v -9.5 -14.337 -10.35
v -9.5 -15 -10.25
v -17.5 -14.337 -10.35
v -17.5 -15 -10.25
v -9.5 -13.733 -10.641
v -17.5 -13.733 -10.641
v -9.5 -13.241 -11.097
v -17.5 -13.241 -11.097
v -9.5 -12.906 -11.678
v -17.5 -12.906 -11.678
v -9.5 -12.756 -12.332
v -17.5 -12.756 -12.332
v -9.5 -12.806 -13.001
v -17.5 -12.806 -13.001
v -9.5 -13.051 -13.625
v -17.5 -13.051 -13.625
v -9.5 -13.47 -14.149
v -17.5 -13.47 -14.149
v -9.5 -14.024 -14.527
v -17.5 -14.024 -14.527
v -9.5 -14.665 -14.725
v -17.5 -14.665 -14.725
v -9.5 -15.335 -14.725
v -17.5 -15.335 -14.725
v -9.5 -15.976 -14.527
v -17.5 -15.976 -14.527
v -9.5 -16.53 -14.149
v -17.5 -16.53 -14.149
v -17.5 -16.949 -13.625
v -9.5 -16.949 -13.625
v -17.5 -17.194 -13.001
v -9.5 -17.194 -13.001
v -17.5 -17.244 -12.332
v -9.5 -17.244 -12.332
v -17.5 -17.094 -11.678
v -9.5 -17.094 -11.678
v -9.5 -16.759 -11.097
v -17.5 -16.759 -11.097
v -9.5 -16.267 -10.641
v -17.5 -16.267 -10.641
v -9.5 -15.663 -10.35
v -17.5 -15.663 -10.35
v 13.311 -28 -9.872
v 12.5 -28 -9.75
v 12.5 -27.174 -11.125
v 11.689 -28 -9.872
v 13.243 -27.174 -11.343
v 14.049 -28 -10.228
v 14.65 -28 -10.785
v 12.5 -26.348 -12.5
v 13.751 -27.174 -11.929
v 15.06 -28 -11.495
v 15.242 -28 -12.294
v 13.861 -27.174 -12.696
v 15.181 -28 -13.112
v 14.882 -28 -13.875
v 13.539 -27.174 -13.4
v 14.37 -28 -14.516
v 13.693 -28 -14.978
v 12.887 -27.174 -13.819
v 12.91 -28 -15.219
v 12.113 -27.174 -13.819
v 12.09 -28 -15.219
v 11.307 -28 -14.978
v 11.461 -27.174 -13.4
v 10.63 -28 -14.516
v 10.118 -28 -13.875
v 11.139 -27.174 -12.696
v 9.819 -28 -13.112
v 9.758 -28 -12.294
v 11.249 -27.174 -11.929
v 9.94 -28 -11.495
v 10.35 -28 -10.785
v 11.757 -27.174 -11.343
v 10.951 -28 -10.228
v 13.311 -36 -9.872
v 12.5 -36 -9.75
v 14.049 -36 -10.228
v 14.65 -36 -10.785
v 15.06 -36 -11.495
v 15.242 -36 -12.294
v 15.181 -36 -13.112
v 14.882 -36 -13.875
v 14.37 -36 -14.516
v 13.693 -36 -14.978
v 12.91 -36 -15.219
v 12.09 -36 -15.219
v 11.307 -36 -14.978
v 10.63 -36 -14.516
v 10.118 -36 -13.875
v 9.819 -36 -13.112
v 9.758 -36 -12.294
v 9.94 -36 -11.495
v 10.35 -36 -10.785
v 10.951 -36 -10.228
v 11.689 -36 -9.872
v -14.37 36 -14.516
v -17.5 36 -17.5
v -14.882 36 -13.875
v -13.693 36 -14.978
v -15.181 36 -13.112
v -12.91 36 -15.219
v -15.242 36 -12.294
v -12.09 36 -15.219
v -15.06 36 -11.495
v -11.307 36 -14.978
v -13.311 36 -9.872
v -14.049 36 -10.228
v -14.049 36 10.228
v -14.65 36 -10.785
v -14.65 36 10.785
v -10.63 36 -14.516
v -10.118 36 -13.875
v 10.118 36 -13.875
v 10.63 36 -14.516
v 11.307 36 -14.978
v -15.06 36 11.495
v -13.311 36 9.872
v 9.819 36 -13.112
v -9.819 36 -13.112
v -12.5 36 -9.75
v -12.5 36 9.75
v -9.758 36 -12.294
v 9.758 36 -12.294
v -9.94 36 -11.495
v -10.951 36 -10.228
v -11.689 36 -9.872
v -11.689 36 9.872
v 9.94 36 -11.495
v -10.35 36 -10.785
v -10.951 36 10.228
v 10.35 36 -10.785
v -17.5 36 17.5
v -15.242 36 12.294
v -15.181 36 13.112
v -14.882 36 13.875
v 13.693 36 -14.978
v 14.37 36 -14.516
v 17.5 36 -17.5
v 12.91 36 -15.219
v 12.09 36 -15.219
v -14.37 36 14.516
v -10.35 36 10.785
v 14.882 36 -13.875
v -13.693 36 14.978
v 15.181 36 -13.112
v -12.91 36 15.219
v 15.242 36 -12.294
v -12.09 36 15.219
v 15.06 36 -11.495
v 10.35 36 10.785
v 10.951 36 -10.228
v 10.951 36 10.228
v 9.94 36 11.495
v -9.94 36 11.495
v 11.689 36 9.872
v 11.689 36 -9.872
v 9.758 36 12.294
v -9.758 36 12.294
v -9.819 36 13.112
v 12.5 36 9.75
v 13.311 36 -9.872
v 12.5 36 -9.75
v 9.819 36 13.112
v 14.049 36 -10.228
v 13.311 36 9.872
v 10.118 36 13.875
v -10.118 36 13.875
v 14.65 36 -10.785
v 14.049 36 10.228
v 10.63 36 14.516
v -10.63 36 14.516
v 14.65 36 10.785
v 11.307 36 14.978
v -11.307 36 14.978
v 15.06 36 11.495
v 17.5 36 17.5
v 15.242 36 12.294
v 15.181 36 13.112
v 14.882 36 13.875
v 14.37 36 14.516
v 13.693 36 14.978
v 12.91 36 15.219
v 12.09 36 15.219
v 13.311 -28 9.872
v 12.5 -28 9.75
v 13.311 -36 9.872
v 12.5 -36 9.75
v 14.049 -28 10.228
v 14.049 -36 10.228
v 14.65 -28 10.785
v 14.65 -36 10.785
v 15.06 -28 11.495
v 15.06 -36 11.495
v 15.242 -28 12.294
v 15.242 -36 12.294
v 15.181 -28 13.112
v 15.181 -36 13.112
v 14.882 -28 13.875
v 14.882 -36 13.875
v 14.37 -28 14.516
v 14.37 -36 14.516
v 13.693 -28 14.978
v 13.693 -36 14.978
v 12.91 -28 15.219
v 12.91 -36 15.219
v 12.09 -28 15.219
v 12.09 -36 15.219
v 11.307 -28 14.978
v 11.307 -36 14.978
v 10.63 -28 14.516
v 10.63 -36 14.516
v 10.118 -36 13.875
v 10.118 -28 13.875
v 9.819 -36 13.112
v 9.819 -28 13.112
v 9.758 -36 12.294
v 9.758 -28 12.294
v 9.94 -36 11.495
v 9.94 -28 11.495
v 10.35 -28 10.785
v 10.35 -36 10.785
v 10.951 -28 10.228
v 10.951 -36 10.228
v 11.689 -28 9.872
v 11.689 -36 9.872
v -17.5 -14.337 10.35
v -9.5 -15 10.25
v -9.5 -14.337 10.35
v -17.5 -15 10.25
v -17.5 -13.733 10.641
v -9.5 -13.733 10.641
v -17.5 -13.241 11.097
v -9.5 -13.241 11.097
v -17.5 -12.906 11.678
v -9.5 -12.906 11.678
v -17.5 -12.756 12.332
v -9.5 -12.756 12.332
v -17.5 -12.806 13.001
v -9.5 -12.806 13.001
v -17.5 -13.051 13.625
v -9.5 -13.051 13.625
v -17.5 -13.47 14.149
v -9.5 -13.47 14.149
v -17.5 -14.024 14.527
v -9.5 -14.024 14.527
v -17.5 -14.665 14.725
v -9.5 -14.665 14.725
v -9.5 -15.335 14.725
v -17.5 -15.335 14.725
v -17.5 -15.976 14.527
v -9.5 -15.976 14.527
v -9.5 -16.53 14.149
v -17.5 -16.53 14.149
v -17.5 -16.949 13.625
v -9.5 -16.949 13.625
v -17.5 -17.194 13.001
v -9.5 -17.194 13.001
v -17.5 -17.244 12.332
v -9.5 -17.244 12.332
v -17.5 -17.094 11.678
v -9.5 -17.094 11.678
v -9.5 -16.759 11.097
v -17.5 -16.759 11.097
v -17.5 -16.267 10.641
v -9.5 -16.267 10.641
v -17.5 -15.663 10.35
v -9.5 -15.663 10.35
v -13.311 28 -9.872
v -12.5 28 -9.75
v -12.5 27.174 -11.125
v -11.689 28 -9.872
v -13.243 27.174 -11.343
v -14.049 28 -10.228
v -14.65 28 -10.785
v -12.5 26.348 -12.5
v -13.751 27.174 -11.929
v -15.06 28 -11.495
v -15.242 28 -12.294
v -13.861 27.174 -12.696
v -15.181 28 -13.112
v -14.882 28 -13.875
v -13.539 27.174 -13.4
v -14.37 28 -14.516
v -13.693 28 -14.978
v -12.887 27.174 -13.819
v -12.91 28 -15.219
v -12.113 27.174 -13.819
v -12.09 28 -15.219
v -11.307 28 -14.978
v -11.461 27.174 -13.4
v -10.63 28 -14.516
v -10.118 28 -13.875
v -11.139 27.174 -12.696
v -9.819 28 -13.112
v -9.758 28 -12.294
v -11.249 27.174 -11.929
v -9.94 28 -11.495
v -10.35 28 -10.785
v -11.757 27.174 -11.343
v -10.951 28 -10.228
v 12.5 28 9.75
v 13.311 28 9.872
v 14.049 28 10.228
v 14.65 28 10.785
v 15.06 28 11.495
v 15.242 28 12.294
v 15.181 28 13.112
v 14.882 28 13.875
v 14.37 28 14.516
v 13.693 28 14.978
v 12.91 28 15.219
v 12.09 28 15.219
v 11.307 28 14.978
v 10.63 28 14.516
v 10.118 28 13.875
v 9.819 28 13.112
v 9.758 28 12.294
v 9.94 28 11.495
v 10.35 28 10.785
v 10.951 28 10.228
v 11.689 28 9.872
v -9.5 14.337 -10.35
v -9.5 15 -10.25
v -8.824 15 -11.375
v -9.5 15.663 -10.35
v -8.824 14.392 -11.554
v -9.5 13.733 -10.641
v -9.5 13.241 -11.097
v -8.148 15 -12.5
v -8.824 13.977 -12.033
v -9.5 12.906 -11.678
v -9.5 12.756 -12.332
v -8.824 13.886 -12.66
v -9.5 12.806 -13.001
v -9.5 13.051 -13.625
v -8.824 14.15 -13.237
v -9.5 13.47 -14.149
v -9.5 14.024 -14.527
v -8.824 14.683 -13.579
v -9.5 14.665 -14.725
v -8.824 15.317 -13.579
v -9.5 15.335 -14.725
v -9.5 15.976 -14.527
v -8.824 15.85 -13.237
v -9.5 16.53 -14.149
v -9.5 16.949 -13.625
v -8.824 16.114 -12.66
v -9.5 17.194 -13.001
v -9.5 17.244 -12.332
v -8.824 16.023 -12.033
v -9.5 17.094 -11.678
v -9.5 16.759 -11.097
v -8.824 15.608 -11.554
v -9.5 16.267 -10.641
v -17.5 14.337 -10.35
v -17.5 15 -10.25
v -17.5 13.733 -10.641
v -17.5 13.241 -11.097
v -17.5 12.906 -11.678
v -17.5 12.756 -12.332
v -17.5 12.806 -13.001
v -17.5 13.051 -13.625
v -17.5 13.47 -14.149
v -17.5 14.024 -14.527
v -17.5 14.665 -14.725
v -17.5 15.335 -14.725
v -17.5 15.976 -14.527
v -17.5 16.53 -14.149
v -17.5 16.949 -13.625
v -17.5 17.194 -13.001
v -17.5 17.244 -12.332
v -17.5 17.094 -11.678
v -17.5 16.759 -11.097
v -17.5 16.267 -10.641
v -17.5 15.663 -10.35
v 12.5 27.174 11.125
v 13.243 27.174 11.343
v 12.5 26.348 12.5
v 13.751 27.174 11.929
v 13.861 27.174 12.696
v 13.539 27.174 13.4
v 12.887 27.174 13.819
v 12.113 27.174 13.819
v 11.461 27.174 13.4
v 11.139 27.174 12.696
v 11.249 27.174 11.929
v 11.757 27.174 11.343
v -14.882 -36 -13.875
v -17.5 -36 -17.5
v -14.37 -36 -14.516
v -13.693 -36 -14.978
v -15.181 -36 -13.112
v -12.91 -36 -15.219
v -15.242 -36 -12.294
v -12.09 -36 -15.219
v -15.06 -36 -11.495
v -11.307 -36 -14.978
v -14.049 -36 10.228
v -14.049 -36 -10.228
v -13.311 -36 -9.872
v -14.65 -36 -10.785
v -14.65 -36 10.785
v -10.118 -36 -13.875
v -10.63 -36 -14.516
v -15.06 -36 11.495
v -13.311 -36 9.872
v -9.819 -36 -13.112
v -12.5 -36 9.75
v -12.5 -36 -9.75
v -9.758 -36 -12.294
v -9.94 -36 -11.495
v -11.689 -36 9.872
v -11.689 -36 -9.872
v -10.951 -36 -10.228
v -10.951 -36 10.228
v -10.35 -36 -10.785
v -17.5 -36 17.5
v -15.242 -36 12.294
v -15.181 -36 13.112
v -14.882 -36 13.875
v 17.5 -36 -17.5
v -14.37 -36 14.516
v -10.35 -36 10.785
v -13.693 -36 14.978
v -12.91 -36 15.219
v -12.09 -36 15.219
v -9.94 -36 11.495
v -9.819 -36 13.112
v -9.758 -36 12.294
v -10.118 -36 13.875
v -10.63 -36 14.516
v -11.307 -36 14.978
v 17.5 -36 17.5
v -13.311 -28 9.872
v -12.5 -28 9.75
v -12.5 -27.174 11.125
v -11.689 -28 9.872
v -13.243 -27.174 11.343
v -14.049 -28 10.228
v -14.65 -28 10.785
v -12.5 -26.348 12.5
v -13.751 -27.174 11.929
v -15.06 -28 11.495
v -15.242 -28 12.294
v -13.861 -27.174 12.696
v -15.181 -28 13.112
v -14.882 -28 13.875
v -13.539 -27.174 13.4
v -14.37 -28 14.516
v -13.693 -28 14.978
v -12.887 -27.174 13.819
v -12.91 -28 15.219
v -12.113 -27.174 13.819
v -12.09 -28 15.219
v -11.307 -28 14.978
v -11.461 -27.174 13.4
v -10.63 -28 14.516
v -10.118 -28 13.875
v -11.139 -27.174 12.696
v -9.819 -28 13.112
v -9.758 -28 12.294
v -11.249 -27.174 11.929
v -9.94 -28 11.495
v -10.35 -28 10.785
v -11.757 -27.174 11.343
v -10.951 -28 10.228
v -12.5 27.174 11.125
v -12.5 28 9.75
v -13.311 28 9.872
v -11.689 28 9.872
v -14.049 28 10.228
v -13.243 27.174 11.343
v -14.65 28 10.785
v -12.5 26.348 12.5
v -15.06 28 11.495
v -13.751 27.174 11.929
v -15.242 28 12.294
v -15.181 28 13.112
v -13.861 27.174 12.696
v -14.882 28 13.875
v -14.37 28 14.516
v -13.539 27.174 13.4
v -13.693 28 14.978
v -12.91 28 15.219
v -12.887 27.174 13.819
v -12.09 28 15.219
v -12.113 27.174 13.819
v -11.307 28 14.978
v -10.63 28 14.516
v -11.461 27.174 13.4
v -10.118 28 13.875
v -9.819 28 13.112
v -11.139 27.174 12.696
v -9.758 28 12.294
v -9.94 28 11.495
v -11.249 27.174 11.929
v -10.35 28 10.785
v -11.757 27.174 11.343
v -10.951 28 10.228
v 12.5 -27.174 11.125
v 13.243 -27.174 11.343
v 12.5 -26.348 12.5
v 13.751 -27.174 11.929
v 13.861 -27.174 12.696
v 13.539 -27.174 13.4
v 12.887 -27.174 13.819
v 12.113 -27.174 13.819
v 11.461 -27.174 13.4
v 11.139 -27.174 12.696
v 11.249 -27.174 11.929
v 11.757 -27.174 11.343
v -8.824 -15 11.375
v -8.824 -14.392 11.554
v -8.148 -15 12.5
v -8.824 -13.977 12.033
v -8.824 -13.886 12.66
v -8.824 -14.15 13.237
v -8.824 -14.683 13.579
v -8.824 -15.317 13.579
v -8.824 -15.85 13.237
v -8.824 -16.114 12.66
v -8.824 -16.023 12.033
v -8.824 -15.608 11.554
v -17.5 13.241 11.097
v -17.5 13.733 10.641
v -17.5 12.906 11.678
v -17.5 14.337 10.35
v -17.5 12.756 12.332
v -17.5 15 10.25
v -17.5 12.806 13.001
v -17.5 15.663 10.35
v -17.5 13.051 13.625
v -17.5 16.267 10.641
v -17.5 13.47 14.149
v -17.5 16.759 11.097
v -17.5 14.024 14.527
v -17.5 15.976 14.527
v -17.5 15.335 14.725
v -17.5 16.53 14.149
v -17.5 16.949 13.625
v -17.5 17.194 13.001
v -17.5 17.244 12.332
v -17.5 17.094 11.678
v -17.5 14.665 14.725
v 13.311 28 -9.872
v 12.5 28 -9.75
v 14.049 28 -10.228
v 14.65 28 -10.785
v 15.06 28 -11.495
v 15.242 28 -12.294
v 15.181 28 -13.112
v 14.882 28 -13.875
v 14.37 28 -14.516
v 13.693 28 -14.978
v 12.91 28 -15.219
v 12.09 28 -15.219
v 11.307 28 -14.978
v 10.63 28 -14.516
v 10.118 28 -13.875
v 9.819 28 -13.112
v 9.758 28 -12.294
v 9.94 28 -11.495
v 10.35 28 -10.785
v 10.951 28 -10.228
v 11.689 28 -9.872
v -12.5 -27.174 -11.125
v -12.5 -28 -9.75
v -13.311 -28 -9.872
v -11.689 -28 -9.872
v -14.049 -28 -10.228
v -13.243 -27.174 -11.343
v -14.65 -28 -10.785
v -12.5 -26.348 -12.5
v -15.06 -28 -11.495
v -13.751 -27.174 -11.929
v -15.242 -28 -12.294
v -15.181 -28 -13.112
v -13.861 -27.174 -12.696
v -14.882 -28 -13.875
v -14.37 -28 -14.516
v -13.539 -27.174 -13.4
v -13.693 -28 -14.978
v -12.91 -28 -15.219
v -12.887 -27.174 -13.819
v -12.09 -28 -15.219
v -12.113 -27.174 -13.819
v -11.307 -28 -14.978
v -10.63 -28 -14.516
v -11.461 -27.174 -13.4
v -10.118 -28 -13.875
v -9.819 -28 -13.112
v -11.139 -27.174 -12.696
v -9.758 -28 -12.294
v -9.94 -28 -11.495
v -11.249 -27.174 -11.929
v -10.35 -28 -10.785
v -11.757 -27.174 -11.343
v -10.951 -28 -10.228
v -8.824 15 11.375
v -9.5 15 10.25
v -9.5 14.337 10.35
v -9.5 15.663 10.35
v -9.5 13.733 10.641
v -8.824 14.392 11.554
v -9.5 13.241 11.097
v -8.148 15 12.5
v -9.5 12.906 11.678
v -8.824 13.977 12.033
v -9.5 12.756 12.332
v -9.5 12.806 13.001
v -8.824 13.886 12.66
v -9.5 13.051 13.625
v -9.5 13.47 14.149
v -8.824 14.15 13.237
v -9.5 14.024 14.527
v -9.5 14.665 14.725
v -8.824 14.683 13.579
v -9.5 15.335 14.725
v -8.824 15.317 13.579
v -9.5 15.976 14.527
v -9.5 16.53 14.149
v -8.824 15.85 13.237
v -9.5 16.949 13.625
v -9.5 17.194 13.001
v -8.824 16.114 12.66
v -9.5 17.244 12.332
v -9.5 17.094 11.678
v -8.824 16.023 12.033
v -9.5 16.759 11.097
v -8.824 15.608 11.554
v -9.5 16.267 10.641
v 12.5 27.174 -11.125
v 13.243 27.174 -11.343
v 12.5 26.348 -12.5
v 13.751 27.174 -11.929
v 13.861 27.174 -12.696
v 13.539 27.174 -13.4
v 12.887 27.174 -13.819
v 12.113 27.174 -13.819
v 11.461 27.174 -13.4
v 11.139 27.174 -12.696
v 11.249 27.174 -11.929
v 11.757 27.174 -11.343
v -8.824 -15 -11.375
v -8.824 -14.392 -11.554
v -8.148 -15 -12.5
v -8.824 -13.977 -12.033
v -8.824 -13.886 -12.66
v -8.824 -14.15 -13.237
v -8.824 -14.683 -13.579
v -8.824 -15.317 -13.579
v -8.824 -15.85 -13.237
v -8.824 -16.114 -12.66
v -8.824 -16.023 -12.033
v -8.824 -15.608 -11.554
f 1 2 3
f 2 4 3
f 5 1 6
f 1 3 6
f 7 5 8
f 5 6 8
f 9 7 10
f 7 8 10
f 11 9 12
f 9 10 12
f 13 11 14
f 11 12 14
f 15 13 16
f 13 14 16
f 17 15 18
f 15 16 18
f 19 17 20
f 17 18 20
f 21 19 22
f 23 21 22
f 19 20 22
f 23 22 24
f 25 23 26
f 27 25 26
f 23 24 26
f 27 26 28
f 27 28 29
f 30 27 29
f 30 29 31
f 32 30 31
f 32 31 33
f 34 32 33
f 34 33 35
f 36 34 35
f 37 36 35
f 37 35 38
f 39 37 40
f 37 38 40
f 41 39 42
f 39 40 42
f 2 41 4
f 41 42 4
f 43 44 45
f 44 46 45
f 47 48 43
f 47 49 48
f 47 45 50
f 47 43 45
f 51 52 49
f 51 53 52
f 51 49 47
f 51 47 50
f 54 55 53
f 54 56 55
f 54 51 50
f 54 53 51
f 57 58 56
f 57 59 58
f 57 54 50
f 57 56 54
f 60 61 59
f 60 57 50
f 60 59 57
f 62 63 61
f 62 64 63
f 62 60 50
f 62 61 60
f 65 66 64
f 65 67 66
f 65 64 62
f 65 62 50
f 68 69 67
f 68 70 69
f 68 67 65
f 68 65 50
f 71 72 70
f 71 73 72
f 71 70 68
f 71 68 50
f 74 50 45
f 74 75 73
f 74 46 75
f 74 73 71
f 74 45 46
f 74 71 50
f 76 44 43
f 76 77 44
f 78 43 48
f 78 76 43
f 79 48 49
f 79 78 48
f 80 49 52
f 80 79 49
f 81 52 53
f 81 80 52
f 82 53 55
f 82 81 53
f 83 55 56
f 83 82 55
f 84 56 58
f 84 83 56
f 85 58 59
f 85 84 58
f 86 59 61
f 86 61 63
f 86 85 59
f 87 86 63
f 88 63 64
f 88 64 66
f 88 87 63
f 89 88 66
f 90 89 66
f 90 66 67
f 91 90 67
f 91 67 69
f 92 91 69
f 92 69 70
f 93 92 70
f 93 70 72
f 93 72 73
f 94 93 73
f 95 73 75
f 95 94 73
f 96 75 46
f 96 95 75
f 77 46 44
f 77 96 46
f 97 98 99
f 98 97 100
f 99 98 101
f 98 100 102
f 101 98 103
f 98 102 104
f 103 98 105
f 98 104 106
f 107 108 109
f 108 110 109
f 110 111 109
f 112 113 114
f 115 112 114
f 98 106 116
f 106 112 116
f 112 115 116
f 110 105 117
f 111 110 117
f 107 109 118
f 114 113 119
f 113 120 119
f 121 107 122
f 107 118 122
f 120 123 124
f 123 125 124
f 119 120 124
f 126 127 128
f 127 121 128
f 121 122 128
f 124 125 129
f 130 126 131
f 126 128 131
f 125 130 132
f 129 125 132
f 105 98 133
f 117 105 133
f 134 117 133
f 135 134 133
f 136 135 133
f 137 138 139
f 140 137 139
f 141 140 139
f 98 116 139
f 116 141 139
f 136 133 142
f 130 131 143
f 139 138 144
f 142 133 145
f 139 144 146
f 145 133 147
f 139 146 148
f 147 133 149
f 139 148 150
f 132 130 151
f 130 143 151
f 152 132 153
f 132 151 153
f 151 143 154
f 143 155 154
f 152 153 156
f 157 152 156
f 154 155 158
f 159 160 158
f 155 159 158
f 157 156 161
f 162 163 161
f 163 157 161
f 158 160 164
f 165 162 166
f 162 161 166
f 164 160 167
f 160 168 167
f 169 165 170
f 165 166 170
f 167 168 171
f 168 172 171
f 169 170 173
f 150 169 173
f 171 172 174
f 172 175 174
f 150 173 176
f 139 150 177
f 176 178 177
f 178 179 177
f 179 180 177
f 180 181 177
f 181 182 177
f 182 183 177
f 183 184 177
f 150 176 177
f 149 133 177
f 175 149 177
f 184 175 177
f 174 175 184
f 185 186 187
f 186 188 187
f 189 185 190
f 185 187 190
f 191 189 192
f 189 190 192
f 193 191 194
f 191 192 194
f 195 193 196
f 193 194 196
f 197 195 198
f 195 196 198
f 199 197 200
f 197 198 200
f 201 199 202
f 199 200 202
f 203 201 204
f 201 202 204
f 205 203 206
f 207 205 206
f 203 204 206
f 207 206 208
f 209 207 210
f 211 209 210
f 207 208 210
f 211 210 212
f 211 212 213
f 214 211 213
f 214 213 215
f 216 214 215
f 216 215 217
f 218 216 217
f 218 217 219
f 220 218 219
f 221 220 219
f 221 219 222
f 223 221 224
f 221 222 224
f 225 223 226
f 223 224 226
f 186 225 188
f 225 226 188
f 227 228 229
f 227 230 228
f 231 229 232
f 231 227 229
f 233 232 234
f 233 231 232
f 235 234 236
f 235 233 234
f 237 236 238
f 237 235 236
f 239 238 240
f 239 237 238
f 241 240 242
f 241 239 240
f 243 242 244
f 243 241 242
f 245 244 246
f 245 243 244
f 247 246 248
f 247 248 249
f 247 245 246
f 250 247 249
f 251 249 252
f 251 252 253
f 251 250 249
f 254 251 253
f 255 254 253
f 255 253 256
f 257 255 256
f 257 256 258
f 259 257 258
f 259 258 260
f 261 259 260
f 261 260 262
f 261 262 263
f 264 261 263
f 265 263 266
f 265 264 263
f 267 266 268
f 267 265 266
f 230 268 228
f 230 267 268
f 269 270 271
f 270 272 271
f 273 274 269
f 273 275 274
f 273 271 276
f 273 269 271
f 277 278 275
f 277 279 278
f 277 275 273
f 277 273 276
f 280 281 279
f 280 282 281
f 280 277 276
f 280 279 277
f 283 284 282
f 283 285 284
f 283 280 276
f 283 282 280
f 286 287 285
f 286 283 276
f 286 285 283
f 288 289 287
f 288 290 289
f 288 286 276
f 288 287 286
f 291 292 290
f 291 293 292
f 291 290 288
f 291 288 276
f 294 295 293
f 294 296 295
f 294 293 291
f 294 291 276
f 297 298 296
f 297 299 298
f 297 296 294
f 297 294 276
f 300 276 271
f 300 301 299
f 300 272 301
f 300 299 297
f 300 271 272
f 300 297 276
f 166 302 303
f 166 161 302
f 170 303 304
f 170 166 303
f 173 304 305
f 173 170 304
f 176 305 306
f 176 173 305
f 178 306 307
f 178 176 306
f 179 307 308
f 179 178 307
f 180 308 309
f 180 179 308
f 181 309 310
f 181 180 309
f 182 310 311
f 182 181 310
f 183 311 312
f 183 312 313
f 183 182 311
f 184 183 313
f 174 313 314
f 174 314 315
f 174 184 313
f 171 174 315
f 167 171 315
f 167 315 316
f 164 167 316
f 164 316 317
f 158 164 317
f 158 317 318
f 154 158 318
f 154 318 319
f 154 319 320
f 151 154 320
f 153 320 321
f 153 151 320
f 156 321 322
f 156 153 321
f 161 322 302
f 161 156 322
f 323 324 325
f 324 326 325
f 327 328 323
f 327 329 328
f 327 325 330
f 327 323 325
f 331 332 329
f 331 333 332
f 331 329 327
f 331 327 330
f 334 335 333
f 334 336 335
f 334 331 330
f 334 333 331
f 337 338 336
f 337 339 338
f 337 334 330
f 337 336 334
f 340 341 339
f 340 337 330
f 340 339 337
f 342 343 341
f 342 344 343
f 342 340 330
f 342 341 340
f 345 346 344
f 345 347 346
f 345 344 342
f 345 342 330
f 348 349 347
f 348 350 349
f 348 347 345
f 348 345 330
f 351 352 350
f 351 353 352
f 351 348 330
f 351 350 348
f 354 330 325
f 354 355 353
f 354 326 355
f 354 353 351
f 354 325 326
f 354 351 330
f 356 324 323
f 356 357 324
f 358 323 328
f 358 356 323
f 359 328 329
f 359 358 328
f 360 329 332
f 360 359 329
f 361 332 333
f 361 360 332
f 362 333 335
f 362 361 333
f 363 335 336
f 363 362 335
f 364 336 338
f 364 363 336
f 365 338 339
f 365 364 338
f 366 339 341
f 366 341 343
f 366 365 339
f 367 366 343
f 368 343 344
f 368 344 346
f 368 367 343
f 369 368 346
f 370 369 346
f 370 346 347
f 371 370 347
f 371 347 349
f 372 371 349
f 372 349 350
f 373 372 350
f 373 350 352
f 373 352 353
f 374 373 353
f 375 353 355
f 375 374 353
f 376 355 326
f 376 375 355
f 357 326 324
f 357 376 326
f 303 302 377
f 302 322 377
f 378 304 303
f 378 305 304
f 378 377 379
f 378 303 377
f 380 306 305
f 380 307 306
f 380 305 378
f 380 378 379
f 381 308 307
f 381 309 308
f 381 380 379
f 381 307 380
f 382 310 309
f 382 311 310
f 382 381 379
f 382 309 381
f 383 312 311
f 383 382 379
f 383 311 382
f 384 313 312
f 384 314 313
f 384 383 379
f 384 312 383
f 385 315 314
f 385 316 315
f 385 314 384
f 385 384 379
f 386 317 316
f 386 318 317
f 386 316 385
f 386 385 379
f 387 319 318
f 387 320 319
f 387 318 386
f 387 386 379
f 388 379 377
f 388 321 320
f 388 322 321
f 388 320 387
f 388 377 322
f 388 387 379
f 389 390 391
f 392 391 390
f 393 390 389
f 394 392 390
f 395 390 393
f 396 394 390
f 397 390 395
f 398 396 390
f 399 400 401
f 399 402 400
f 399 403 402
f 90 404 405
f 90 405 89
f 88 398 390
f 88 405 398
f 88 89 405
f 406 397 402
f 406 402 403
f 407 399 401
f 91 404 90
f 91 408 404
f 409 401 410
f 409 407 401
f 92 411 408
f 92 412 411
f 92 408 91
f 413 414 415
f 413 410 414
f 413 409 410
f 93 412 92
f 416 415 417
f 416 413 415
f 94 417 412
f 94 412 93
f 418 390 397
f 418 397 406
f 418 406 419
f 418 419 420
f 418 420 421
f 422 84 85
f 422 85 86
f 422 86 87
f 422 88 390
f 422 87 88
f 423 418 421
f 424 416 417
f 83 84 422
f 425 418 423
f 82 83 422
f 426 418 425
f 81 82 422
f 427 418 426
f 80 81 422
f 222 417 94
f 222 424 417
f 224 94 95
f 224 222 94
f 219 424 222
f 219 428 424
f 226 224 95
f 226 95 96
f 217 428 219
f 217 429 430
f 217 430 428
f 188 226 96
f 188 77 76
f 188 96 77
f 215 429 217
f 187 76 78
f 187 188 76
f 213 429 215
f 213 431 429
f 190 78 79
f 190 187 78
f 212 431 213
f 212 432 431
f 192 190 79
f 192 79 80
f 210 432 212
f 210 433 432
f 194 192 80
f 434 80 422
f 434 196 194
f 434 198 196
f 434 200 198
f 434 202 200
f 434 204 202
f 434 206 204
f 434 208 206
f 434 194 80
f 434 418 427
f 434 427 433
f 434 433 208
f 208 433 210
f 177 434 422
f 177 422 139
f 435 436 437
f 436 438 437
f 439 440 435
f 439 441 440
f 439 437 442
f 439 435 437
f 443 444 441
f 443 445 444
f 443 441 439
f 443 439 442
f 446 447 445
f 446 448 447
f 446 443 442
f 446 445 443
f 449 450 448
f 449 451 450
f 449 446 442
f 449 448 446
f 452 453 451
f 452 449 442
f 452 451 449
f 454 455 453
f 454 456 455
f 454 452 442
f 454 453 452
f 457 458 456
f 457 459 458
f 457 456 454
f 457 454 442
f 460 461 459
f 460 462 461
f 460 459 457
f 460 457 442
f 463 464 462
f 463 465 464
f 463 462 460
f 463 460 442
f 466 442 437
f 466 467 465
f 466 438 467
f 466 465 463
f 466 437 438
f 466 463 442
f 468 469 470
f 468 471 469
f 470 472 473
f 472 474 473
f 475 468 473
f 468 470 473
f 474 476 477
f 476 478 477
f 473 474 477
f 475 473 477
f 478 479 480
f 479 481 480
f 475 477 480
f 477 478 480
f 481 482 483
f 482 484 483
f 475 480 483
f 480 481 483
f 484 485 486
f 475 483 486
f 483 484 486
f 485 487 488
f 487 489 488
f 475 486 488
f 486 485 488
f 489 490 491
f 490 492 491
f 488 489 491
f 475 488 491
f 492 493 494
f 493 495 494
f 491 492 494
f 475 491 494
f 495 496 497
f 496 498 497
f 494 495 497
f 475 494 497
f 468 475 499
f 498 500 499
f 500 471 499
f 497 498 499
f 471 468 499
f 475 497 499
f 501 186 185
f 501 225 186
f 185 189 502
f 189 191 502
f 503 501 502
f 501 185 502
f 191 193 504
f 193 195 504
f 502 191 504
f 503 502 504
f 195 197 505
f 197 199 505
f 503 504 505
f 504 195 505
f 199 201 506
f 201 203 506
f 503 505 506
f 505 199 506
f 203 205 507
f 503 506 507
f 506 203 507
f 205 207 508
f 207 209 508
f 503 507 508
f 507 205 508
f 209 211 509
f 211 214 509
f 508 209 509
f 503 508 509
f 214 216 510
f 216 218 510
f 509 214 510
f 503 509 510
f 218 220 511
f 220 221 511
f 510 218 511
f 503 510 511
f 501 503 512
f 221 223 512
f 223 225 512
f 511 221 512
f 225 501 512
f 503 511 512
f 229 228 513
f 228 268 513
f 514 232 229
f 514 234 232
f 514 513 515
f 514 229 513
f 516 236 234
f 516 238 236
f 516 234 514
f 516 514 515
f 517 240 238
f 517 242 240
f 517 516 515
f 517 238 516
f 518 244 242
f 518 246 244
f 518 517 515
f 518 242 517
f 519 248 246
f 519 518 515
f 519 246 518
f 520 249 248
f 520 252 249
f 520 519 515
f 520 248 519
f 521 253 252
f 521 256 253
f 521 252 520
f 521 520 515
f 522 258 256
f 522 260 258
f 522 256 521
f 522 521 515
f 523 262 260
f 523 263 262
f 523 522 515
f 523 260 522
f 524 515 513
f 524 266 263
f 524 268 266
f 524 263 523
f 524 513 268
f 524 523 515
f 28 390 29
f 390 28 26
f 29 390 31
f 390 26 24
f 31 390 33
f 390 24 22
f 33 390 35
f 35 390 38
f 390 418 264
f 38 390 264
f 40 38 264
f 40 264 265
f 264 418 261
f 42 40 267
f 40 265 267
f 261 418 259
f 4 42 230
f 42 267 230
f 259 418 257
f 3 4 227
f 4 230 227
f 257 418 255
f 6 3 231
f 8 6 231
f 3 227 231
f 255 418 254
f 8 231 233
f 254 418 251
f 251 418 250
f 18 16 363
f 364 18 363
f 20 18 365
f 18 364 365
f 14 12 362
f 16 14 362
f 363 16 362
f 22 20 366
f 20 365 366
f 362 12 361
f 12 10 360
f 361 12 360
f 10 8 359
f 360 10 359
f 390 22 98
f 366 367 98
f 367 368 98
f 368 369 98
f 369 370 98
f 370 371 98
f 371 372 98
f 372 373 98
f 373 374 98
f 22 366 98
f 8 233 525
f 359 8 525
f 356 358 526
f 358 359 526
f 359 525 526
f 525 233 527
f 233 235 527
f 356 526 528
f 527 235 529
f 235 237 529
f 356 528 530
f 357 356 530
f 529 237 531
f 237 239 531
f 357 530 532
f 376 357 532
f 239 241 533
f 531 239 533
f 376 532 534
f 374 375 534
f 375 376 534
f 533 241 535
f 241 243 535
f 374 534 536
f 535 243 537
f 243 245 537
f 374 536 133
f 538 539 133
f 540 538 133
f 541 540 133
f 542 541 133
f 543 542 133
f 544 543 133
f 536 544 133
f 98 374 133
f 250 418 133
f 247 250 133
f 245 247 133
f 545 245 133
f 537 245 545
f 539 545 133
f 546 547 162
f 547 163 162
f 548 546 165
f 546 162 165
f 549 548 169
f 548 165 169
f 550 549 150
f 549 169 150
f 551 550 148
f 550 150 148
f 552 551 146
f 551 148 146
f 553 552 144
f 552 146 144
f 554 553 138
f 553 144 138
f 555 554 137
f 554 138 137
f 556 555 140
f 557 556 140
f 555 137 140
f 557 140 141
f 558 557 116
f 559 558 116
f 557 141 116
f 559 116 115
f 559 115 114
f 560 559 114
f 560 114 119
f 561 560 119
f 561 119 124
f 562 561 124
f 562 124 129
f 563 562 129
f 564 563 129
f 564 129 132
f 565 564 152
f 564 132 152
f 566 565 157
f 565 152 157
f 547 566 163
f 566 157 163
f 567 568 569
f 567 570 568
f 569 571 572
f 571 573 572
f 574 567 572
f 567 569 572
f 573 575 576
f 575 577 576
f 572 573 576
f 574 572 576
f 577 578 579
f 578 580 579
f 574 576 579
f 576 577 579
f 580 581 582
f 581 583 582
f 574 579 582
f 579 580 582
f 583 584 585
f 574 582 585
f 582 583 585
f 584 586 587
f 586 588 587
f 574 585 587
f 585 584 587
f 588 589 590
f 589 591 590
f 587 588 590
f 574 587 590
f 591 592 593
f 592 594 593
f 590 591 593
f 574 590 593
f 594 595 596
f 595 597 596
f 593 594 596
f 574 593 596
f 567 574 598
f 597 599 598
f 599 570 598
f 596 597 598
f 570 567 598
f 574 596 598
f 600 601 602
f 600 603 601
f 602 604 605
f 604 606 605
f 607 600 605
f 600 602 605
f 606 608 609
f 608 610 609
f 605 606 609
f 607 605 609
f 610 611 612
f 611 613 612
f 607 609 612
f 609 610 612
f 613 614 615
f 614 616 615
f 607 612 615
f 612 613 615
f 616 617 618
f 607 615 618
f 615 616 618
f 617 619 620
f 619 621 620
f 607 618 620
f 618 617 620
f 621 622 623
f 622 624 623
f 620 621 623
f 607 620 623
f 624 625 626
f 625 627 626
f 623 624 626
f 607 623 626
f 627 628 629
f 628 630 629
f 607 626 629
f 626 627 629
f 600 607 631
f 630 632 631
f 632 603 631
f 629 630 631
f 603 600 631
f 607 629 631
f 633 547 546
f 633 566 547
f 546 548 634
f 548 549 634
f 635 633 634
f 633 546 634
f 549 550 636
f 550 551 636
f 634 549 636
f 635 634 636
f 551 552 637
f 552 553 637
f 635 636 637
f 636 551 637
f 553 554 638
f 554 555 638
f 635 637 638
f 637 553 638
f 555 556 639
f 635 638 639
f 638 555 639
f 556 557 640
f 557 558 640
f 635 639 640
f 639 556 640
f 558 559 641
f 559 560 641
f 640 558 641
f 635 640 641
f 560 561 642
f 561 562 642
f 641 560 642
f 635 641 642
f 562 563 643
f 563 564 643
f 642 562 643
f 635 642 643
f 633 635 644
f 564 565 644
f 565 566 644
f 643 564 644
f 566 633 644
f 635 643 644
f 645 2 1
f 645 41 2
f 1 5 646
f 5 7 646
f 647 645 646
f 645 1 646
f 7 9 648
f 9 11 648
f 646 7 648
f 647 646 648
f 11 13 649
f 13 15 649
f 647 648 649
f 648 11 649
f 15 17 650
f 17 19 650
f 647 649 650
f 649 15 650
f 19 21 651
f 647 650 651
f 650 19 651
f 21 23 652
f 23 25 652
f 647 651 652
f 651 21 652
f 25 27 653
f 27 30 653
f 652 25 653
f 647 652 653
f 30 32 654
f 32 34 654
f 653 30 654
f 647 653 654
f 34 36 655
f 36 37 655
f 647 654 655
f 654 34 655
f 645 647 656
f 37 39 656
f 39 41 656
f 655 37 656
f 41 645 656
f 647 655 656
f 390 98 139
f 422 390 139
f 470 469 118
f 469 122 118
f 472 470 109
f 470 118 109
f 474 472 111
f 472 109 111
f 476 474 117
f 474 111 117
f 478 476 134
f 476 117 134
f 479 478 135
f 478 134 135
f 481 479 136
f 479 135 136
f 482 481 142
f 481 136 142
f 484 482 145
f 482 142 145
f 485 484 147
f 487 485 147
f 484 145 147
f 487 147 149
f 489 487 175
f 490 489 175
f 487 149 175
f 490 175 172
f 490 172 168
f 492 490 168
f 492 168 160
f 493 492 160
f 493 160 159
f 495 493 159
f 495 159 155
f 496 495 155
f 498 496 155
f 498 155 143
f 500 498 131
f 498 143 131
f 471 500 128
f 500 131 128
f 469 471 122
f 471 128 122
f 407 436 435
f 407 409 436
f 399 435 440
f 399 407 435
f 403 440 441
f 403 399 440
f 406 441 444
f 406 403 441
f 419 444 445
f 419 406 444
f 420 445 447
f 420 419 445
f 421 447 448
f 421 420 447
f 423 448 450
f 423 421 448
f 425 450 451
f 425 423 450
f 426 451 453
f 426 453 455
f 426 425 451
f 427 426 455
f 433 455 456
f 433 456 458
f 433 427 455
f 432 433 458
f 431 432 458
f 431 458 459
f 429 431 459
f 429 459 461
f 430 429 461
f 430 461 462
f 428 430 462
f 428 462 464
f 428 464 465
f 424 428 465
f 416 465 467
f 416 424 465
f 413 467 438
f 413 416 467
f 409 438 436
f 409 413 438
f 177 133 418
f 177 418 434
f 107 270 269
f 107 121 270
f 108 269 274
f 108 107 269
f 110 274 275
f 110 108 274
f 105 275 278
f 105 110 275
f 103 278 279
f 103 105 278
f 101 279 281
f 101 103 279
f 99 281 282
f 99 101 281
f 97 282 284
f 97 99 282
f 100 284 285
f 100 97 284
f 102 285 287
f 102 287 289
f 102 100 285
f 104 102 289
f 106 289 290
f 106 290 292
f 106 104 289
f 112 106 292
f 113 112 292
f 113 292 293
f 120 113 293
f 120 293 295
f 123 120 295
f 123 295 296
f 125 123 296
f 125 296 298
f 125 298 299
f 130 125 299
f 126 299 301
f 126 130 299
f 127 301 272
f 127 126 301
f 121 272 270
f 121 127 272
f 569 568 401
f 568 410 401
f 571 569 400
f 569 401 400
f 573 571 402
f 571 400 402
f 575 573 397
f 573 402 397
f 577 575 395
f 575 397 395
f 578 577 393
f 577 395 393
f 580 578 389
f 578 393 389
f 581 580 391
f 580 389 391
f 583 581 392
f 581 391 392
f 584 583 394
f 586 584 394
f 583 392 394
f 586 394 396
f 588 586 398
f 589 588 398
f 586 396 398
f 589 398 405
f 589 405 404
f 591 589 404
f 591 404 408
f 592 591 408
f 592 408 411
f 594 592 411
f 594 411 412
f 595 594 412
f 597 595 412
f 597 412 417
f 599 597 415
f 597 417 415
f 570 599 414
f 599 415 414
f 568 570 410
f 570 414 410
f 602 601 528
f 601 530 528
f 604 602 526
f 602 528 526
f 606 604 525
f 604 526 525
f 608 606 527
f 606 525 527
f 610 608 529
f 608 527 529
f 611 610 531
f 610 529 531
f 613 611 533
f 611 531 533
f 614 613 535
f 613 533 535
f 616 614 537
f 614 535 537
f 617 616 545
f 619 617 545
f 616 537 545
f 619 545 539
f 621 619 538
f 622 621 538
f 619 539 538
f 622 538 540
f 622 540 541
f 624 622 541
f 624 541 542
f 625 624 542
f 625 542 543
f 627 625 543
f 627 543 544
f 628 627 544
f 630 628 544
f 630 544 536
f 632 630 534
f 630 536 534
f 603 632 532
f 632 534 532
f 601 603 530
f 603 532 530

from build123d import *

# Parameters (mm, degrees)
SKETCH1_W           = 35
SKETCH1_H           = 72
BOSS_EXTRUDE1_DEPTH = 17.5


with BuildPart() as part:
    # Sketch1 → Boss-Extrude1 (new, symmetric)
    with BuildSketch(Plane.XY):
        Rectangle(SKETCH1_W, SKETCH1_H)
    extrude(amount=BOSS_EXTRUDE1_DEPTH, both=True)

    # Sketch3 → M5 Clearance Hole1 (revolve, cut)
    with BuildSketch(Plane(origin=(-12.5, 36, -12.5), x_dir=(0, 0, 1), z_dir=(1, 0, 0))):
        Polygon((0, 0), (0, 9.652366702), (2.75, 8), (2.75, 0), align=None)
    m5_clearance_hole1 = revolve(axis=Axis((-12.5, 42.35, -12.5), (0, -1, 0)), mode=Mode.SUBTRACT)

    # Mirror1: M5 Clearance Hole1 across plane
    add(m5_clearance_hole1.mirror(Plane(origin=(0, 0, 0), x_dir=(0, 0, 1), z_dir=(1, 0, 0))), mode=Mode.SUBTRACT)

    # Mirror2: M5 Clearance Hole1 across plane
    add(m5_clearance_hole1.mirror(Plane.XY), mode=Mode.SUBTRACT)

    # Mirror2 copy 1 sketch → Mirror2 copy 1 (revolve, cut)
    with BuildSketch(Plane(origin=(12.5, 36, 12.5), x_dir=(0, 0, -1), z_dir=(-1, 0, 0))):
        Polygon((0, 0), (0, 9.652366702), (2.75, 8), (2.75, 0), align=None)
    revolve(axis=Axis((12.5, 42.35, 12.5), (0, -1, 0)), mode=Mode.SUBTRACT)

    # Mirror3: M5 Clearance Hole1 across plane
    add(m5_clearance_hole1.mirror(Plane.ZX), mode=Mode.SUBTRACT)

    # Mirror3 copy 1 sketch → Mirror3 copy 1 (revolve, cut)
    with BuildSketch(Plane(origin=(12.5, -36, -12.5), x_dir=(0, 0, 1), z_dir=(-1, 0, 0))):
        Polygon((0, 0), (0, 9.652366702), (2.75, 8), (2.75, 0), align=None)
    revolve(axis=Axis((12.5, -42.35, -12.5), (0, 1, 0)), mode=Mode.SUBTRACT)

    # Mirror3 copy 2 sketch → Mirror3 copy 2 (revolve, cut)
    with BuildSketch(Plane(origin=(-12.5, -36, 12.5), x_dir=(0, 0, -1), z_dir=(1, 0, 0))):
        Polygon((0, 0), (0, 9.652366702), (2.75, 8), (2.75, 0), align=None)
    revolve(axis=Axis((-12.5, -42.35, 12.5), (0, 1, 0)), mode=Mode.SUBTRACT)

    # Mirror3 copy 3 sketch → Mirror3 copy 3 (revolve, cut)
    with BuildSketch(Plane(origin=(12.5, -36, 12.5), x_dir=(0, 0, -1), z_dir=(-1, 0, 0))):
        Polygon((0, 0), (0, -9.652366702), (2.75, -8), (2.75, 0), align=None)
    revolve(axis=Axis((12.5, -42.35, 12.5), (0, -1, 0)), mode=Mode.SUBTRACT)

    # Sketch6 → M4 Clearance Hole1 (revolve, cut)
    with BuildSketch(Plane(origin=(-17.5, 15, -12.5), x_dir=(0, 0, 1), z_dir=(0, 1, 0))):
        Polygon((0, 0), (0, 9.351936393), (2.25, 8), (2.25, 0), align=None)
    m4_clearance_hole1 = revolve(axis=Axis((-23.85, 15, -12.5), (1, 0, 0)), mode=Mode.SUBTRACT)

    # Mirror4: M4 Clearance Hole1 across plane
    add(m4_clearance_hole1.mirror(Plane.XY), mode=Mode.SUBTRACT)

    # Mirror5 copy 1 sketch → Mirror5 copy 1 (revolve, cut)
    with BuildSketch(Plane(origin=(-17.5, -15, 12.5), x_dir=(0, 0, -1), z_dir=(0, -1, 0))):
        Polygon((0, 0), (0, 9.351936393), (2.25, 8), (2.25, 0), align=None)
    revolve(axis=Axis((-23.85, -15, 12.5), (1, 0, 0)), mode=Mode.SUBTRACT)

    # Mirror5 copy 2 sketch → Mirror5 copy 2 (revolve, cut)
    with BuildSketch(Plane(origin=(-17.5, -15, -12.5), x_dir=(0, 0, 1), z_dir=(0, -1, 0))):
        Polygon((0, 0), (0, -9.351936393), (2.25, -8), (2.25, 0), align=None)
    revolve(axis=Axis((-23.85, -15, -12.5), (-1, 0, 0)), mode=Mode.SUBTRACT)


solid = part.part
